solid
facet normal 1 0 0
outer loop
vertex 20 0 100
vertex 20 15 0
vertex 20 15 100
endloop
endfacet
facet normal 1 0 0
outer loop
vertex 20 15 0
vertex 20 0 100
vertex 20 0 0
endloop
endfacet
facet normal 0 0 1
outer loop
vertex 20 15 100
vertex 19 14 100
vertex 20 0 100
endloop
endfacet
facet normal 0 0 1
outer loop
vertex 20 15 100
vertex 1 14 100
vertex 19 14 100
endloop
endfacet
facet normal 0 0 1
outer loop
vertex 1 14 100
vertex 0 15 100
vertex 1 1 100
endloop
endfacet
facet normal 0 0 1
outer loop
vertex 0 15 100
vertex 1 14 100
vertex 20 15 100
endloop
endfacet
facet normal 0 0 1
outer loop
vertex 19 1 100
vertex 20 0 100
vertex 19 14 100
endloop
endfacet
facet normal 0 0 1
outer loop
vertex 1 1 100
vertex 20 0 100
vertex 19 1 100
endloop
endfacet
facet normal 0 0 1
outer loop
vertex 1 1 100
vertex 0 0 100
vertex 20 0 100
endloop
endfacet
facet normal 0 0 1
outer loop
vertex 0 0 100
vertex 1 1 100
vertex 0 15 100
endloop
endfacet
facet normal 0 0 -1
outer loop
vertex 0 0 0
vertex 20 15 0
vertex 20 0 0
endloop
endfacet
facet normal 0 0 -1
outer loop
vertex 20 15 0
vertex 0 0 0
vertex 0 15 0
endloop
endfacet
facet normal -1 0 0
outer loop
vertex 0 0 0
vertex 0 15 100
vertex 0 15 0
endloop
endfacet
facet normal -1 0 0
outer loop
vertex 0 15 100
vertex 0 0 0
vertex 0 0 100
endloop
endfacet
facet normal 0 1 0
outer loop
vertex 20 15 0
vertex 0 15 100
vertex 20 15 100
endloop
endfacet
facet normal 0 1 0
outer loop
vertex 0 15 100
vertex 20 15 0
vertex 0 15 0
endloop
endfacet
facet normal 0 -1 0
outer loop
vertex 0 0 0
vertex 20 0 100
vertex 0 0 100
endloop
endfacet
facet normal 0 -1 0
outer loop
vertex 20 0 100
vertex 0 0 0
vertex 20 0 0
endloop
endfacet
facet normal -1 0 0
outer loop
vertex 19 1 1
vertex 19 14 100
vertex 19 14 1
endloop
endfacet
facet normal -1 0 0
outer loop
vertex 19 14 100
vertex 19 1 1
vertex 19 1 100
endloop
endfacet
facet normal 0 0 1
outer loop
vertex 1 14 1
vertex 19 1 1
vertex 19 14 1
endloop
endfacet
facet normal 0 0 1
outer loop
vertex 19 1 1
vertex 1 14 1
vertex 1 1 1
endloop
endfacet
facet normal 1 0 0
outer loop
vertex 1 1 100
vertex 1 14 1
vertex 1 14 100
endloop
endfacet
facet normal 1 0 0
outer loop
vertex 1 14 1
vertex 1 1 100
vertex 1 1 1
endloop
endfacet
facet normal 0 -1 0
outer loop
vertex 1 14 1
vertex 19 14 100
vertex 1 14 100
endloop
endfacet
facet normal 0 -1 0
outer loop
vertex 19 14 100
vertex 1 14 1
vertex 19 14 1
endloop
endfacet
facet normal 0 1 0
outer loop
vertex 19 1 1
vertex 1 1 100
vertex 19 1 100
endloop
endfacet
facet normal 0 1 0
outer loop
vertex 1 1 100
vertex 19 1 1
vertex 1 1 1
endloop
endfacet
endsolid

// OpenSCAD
difference() {
  translate([10.0000000000, 7.5000000000, 50.0000000000]) {
    scale([20.0000000000, 15.0000000000, 100.0000000000]) {
      translate([-0.5000000000, -0.5000000000, -0.5000000000]) {
        cube([1, 1, 1]);
      }
    }
  }
  translate([10.0000000000, 7.5000000000, 50.5000000000]) {
    scale([18.0000000000, 13.0000000000, 99.0000000000]) {
      translate([-0.5000000000, -0.5000000000, -0.5000000000]) {
        cube([1, 1, 1]);
      }
    }
  }
}
